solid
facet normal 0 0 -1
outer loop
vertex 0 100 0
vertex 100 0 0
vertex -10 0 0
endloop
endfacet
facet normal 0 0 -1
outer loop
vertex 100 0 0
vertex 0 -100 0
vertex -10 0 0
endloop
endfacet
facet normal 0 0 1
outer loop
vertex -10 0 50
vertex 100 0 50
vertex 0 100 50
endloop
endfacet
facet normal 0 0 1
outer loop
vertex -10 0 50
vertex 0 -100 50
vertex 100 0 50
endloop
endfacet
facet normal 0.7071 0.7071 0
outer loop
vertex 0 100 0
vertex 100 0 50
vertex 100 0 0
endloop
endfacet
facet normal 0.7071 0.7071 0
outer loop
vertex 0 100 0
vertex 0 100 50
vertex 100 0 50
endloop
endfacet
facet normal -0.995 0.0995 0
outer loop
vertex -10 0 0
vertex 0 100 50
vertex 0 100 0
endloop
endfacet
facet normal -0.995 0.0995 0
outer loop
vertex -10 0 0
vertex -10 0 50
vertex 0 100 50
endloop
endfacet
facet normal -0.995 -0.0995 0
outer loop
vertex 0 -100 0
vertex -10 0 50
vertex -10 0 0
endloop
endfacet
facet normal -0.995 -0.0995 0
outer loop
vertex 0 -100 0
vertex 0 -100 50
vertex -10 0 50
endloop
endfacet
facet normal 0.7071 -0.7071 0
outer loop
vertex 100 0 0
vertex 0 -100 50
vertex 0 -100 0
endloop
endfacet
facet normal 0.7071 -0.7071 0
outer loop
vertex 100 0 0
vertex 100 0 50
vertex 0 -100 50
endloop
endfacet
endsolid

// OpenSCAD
linear_extrude(50.0000){polygon(points=[[100.0,0.0],[0.0,100.0],[-10.0,0.0],[0.0,-100.0]]);}
